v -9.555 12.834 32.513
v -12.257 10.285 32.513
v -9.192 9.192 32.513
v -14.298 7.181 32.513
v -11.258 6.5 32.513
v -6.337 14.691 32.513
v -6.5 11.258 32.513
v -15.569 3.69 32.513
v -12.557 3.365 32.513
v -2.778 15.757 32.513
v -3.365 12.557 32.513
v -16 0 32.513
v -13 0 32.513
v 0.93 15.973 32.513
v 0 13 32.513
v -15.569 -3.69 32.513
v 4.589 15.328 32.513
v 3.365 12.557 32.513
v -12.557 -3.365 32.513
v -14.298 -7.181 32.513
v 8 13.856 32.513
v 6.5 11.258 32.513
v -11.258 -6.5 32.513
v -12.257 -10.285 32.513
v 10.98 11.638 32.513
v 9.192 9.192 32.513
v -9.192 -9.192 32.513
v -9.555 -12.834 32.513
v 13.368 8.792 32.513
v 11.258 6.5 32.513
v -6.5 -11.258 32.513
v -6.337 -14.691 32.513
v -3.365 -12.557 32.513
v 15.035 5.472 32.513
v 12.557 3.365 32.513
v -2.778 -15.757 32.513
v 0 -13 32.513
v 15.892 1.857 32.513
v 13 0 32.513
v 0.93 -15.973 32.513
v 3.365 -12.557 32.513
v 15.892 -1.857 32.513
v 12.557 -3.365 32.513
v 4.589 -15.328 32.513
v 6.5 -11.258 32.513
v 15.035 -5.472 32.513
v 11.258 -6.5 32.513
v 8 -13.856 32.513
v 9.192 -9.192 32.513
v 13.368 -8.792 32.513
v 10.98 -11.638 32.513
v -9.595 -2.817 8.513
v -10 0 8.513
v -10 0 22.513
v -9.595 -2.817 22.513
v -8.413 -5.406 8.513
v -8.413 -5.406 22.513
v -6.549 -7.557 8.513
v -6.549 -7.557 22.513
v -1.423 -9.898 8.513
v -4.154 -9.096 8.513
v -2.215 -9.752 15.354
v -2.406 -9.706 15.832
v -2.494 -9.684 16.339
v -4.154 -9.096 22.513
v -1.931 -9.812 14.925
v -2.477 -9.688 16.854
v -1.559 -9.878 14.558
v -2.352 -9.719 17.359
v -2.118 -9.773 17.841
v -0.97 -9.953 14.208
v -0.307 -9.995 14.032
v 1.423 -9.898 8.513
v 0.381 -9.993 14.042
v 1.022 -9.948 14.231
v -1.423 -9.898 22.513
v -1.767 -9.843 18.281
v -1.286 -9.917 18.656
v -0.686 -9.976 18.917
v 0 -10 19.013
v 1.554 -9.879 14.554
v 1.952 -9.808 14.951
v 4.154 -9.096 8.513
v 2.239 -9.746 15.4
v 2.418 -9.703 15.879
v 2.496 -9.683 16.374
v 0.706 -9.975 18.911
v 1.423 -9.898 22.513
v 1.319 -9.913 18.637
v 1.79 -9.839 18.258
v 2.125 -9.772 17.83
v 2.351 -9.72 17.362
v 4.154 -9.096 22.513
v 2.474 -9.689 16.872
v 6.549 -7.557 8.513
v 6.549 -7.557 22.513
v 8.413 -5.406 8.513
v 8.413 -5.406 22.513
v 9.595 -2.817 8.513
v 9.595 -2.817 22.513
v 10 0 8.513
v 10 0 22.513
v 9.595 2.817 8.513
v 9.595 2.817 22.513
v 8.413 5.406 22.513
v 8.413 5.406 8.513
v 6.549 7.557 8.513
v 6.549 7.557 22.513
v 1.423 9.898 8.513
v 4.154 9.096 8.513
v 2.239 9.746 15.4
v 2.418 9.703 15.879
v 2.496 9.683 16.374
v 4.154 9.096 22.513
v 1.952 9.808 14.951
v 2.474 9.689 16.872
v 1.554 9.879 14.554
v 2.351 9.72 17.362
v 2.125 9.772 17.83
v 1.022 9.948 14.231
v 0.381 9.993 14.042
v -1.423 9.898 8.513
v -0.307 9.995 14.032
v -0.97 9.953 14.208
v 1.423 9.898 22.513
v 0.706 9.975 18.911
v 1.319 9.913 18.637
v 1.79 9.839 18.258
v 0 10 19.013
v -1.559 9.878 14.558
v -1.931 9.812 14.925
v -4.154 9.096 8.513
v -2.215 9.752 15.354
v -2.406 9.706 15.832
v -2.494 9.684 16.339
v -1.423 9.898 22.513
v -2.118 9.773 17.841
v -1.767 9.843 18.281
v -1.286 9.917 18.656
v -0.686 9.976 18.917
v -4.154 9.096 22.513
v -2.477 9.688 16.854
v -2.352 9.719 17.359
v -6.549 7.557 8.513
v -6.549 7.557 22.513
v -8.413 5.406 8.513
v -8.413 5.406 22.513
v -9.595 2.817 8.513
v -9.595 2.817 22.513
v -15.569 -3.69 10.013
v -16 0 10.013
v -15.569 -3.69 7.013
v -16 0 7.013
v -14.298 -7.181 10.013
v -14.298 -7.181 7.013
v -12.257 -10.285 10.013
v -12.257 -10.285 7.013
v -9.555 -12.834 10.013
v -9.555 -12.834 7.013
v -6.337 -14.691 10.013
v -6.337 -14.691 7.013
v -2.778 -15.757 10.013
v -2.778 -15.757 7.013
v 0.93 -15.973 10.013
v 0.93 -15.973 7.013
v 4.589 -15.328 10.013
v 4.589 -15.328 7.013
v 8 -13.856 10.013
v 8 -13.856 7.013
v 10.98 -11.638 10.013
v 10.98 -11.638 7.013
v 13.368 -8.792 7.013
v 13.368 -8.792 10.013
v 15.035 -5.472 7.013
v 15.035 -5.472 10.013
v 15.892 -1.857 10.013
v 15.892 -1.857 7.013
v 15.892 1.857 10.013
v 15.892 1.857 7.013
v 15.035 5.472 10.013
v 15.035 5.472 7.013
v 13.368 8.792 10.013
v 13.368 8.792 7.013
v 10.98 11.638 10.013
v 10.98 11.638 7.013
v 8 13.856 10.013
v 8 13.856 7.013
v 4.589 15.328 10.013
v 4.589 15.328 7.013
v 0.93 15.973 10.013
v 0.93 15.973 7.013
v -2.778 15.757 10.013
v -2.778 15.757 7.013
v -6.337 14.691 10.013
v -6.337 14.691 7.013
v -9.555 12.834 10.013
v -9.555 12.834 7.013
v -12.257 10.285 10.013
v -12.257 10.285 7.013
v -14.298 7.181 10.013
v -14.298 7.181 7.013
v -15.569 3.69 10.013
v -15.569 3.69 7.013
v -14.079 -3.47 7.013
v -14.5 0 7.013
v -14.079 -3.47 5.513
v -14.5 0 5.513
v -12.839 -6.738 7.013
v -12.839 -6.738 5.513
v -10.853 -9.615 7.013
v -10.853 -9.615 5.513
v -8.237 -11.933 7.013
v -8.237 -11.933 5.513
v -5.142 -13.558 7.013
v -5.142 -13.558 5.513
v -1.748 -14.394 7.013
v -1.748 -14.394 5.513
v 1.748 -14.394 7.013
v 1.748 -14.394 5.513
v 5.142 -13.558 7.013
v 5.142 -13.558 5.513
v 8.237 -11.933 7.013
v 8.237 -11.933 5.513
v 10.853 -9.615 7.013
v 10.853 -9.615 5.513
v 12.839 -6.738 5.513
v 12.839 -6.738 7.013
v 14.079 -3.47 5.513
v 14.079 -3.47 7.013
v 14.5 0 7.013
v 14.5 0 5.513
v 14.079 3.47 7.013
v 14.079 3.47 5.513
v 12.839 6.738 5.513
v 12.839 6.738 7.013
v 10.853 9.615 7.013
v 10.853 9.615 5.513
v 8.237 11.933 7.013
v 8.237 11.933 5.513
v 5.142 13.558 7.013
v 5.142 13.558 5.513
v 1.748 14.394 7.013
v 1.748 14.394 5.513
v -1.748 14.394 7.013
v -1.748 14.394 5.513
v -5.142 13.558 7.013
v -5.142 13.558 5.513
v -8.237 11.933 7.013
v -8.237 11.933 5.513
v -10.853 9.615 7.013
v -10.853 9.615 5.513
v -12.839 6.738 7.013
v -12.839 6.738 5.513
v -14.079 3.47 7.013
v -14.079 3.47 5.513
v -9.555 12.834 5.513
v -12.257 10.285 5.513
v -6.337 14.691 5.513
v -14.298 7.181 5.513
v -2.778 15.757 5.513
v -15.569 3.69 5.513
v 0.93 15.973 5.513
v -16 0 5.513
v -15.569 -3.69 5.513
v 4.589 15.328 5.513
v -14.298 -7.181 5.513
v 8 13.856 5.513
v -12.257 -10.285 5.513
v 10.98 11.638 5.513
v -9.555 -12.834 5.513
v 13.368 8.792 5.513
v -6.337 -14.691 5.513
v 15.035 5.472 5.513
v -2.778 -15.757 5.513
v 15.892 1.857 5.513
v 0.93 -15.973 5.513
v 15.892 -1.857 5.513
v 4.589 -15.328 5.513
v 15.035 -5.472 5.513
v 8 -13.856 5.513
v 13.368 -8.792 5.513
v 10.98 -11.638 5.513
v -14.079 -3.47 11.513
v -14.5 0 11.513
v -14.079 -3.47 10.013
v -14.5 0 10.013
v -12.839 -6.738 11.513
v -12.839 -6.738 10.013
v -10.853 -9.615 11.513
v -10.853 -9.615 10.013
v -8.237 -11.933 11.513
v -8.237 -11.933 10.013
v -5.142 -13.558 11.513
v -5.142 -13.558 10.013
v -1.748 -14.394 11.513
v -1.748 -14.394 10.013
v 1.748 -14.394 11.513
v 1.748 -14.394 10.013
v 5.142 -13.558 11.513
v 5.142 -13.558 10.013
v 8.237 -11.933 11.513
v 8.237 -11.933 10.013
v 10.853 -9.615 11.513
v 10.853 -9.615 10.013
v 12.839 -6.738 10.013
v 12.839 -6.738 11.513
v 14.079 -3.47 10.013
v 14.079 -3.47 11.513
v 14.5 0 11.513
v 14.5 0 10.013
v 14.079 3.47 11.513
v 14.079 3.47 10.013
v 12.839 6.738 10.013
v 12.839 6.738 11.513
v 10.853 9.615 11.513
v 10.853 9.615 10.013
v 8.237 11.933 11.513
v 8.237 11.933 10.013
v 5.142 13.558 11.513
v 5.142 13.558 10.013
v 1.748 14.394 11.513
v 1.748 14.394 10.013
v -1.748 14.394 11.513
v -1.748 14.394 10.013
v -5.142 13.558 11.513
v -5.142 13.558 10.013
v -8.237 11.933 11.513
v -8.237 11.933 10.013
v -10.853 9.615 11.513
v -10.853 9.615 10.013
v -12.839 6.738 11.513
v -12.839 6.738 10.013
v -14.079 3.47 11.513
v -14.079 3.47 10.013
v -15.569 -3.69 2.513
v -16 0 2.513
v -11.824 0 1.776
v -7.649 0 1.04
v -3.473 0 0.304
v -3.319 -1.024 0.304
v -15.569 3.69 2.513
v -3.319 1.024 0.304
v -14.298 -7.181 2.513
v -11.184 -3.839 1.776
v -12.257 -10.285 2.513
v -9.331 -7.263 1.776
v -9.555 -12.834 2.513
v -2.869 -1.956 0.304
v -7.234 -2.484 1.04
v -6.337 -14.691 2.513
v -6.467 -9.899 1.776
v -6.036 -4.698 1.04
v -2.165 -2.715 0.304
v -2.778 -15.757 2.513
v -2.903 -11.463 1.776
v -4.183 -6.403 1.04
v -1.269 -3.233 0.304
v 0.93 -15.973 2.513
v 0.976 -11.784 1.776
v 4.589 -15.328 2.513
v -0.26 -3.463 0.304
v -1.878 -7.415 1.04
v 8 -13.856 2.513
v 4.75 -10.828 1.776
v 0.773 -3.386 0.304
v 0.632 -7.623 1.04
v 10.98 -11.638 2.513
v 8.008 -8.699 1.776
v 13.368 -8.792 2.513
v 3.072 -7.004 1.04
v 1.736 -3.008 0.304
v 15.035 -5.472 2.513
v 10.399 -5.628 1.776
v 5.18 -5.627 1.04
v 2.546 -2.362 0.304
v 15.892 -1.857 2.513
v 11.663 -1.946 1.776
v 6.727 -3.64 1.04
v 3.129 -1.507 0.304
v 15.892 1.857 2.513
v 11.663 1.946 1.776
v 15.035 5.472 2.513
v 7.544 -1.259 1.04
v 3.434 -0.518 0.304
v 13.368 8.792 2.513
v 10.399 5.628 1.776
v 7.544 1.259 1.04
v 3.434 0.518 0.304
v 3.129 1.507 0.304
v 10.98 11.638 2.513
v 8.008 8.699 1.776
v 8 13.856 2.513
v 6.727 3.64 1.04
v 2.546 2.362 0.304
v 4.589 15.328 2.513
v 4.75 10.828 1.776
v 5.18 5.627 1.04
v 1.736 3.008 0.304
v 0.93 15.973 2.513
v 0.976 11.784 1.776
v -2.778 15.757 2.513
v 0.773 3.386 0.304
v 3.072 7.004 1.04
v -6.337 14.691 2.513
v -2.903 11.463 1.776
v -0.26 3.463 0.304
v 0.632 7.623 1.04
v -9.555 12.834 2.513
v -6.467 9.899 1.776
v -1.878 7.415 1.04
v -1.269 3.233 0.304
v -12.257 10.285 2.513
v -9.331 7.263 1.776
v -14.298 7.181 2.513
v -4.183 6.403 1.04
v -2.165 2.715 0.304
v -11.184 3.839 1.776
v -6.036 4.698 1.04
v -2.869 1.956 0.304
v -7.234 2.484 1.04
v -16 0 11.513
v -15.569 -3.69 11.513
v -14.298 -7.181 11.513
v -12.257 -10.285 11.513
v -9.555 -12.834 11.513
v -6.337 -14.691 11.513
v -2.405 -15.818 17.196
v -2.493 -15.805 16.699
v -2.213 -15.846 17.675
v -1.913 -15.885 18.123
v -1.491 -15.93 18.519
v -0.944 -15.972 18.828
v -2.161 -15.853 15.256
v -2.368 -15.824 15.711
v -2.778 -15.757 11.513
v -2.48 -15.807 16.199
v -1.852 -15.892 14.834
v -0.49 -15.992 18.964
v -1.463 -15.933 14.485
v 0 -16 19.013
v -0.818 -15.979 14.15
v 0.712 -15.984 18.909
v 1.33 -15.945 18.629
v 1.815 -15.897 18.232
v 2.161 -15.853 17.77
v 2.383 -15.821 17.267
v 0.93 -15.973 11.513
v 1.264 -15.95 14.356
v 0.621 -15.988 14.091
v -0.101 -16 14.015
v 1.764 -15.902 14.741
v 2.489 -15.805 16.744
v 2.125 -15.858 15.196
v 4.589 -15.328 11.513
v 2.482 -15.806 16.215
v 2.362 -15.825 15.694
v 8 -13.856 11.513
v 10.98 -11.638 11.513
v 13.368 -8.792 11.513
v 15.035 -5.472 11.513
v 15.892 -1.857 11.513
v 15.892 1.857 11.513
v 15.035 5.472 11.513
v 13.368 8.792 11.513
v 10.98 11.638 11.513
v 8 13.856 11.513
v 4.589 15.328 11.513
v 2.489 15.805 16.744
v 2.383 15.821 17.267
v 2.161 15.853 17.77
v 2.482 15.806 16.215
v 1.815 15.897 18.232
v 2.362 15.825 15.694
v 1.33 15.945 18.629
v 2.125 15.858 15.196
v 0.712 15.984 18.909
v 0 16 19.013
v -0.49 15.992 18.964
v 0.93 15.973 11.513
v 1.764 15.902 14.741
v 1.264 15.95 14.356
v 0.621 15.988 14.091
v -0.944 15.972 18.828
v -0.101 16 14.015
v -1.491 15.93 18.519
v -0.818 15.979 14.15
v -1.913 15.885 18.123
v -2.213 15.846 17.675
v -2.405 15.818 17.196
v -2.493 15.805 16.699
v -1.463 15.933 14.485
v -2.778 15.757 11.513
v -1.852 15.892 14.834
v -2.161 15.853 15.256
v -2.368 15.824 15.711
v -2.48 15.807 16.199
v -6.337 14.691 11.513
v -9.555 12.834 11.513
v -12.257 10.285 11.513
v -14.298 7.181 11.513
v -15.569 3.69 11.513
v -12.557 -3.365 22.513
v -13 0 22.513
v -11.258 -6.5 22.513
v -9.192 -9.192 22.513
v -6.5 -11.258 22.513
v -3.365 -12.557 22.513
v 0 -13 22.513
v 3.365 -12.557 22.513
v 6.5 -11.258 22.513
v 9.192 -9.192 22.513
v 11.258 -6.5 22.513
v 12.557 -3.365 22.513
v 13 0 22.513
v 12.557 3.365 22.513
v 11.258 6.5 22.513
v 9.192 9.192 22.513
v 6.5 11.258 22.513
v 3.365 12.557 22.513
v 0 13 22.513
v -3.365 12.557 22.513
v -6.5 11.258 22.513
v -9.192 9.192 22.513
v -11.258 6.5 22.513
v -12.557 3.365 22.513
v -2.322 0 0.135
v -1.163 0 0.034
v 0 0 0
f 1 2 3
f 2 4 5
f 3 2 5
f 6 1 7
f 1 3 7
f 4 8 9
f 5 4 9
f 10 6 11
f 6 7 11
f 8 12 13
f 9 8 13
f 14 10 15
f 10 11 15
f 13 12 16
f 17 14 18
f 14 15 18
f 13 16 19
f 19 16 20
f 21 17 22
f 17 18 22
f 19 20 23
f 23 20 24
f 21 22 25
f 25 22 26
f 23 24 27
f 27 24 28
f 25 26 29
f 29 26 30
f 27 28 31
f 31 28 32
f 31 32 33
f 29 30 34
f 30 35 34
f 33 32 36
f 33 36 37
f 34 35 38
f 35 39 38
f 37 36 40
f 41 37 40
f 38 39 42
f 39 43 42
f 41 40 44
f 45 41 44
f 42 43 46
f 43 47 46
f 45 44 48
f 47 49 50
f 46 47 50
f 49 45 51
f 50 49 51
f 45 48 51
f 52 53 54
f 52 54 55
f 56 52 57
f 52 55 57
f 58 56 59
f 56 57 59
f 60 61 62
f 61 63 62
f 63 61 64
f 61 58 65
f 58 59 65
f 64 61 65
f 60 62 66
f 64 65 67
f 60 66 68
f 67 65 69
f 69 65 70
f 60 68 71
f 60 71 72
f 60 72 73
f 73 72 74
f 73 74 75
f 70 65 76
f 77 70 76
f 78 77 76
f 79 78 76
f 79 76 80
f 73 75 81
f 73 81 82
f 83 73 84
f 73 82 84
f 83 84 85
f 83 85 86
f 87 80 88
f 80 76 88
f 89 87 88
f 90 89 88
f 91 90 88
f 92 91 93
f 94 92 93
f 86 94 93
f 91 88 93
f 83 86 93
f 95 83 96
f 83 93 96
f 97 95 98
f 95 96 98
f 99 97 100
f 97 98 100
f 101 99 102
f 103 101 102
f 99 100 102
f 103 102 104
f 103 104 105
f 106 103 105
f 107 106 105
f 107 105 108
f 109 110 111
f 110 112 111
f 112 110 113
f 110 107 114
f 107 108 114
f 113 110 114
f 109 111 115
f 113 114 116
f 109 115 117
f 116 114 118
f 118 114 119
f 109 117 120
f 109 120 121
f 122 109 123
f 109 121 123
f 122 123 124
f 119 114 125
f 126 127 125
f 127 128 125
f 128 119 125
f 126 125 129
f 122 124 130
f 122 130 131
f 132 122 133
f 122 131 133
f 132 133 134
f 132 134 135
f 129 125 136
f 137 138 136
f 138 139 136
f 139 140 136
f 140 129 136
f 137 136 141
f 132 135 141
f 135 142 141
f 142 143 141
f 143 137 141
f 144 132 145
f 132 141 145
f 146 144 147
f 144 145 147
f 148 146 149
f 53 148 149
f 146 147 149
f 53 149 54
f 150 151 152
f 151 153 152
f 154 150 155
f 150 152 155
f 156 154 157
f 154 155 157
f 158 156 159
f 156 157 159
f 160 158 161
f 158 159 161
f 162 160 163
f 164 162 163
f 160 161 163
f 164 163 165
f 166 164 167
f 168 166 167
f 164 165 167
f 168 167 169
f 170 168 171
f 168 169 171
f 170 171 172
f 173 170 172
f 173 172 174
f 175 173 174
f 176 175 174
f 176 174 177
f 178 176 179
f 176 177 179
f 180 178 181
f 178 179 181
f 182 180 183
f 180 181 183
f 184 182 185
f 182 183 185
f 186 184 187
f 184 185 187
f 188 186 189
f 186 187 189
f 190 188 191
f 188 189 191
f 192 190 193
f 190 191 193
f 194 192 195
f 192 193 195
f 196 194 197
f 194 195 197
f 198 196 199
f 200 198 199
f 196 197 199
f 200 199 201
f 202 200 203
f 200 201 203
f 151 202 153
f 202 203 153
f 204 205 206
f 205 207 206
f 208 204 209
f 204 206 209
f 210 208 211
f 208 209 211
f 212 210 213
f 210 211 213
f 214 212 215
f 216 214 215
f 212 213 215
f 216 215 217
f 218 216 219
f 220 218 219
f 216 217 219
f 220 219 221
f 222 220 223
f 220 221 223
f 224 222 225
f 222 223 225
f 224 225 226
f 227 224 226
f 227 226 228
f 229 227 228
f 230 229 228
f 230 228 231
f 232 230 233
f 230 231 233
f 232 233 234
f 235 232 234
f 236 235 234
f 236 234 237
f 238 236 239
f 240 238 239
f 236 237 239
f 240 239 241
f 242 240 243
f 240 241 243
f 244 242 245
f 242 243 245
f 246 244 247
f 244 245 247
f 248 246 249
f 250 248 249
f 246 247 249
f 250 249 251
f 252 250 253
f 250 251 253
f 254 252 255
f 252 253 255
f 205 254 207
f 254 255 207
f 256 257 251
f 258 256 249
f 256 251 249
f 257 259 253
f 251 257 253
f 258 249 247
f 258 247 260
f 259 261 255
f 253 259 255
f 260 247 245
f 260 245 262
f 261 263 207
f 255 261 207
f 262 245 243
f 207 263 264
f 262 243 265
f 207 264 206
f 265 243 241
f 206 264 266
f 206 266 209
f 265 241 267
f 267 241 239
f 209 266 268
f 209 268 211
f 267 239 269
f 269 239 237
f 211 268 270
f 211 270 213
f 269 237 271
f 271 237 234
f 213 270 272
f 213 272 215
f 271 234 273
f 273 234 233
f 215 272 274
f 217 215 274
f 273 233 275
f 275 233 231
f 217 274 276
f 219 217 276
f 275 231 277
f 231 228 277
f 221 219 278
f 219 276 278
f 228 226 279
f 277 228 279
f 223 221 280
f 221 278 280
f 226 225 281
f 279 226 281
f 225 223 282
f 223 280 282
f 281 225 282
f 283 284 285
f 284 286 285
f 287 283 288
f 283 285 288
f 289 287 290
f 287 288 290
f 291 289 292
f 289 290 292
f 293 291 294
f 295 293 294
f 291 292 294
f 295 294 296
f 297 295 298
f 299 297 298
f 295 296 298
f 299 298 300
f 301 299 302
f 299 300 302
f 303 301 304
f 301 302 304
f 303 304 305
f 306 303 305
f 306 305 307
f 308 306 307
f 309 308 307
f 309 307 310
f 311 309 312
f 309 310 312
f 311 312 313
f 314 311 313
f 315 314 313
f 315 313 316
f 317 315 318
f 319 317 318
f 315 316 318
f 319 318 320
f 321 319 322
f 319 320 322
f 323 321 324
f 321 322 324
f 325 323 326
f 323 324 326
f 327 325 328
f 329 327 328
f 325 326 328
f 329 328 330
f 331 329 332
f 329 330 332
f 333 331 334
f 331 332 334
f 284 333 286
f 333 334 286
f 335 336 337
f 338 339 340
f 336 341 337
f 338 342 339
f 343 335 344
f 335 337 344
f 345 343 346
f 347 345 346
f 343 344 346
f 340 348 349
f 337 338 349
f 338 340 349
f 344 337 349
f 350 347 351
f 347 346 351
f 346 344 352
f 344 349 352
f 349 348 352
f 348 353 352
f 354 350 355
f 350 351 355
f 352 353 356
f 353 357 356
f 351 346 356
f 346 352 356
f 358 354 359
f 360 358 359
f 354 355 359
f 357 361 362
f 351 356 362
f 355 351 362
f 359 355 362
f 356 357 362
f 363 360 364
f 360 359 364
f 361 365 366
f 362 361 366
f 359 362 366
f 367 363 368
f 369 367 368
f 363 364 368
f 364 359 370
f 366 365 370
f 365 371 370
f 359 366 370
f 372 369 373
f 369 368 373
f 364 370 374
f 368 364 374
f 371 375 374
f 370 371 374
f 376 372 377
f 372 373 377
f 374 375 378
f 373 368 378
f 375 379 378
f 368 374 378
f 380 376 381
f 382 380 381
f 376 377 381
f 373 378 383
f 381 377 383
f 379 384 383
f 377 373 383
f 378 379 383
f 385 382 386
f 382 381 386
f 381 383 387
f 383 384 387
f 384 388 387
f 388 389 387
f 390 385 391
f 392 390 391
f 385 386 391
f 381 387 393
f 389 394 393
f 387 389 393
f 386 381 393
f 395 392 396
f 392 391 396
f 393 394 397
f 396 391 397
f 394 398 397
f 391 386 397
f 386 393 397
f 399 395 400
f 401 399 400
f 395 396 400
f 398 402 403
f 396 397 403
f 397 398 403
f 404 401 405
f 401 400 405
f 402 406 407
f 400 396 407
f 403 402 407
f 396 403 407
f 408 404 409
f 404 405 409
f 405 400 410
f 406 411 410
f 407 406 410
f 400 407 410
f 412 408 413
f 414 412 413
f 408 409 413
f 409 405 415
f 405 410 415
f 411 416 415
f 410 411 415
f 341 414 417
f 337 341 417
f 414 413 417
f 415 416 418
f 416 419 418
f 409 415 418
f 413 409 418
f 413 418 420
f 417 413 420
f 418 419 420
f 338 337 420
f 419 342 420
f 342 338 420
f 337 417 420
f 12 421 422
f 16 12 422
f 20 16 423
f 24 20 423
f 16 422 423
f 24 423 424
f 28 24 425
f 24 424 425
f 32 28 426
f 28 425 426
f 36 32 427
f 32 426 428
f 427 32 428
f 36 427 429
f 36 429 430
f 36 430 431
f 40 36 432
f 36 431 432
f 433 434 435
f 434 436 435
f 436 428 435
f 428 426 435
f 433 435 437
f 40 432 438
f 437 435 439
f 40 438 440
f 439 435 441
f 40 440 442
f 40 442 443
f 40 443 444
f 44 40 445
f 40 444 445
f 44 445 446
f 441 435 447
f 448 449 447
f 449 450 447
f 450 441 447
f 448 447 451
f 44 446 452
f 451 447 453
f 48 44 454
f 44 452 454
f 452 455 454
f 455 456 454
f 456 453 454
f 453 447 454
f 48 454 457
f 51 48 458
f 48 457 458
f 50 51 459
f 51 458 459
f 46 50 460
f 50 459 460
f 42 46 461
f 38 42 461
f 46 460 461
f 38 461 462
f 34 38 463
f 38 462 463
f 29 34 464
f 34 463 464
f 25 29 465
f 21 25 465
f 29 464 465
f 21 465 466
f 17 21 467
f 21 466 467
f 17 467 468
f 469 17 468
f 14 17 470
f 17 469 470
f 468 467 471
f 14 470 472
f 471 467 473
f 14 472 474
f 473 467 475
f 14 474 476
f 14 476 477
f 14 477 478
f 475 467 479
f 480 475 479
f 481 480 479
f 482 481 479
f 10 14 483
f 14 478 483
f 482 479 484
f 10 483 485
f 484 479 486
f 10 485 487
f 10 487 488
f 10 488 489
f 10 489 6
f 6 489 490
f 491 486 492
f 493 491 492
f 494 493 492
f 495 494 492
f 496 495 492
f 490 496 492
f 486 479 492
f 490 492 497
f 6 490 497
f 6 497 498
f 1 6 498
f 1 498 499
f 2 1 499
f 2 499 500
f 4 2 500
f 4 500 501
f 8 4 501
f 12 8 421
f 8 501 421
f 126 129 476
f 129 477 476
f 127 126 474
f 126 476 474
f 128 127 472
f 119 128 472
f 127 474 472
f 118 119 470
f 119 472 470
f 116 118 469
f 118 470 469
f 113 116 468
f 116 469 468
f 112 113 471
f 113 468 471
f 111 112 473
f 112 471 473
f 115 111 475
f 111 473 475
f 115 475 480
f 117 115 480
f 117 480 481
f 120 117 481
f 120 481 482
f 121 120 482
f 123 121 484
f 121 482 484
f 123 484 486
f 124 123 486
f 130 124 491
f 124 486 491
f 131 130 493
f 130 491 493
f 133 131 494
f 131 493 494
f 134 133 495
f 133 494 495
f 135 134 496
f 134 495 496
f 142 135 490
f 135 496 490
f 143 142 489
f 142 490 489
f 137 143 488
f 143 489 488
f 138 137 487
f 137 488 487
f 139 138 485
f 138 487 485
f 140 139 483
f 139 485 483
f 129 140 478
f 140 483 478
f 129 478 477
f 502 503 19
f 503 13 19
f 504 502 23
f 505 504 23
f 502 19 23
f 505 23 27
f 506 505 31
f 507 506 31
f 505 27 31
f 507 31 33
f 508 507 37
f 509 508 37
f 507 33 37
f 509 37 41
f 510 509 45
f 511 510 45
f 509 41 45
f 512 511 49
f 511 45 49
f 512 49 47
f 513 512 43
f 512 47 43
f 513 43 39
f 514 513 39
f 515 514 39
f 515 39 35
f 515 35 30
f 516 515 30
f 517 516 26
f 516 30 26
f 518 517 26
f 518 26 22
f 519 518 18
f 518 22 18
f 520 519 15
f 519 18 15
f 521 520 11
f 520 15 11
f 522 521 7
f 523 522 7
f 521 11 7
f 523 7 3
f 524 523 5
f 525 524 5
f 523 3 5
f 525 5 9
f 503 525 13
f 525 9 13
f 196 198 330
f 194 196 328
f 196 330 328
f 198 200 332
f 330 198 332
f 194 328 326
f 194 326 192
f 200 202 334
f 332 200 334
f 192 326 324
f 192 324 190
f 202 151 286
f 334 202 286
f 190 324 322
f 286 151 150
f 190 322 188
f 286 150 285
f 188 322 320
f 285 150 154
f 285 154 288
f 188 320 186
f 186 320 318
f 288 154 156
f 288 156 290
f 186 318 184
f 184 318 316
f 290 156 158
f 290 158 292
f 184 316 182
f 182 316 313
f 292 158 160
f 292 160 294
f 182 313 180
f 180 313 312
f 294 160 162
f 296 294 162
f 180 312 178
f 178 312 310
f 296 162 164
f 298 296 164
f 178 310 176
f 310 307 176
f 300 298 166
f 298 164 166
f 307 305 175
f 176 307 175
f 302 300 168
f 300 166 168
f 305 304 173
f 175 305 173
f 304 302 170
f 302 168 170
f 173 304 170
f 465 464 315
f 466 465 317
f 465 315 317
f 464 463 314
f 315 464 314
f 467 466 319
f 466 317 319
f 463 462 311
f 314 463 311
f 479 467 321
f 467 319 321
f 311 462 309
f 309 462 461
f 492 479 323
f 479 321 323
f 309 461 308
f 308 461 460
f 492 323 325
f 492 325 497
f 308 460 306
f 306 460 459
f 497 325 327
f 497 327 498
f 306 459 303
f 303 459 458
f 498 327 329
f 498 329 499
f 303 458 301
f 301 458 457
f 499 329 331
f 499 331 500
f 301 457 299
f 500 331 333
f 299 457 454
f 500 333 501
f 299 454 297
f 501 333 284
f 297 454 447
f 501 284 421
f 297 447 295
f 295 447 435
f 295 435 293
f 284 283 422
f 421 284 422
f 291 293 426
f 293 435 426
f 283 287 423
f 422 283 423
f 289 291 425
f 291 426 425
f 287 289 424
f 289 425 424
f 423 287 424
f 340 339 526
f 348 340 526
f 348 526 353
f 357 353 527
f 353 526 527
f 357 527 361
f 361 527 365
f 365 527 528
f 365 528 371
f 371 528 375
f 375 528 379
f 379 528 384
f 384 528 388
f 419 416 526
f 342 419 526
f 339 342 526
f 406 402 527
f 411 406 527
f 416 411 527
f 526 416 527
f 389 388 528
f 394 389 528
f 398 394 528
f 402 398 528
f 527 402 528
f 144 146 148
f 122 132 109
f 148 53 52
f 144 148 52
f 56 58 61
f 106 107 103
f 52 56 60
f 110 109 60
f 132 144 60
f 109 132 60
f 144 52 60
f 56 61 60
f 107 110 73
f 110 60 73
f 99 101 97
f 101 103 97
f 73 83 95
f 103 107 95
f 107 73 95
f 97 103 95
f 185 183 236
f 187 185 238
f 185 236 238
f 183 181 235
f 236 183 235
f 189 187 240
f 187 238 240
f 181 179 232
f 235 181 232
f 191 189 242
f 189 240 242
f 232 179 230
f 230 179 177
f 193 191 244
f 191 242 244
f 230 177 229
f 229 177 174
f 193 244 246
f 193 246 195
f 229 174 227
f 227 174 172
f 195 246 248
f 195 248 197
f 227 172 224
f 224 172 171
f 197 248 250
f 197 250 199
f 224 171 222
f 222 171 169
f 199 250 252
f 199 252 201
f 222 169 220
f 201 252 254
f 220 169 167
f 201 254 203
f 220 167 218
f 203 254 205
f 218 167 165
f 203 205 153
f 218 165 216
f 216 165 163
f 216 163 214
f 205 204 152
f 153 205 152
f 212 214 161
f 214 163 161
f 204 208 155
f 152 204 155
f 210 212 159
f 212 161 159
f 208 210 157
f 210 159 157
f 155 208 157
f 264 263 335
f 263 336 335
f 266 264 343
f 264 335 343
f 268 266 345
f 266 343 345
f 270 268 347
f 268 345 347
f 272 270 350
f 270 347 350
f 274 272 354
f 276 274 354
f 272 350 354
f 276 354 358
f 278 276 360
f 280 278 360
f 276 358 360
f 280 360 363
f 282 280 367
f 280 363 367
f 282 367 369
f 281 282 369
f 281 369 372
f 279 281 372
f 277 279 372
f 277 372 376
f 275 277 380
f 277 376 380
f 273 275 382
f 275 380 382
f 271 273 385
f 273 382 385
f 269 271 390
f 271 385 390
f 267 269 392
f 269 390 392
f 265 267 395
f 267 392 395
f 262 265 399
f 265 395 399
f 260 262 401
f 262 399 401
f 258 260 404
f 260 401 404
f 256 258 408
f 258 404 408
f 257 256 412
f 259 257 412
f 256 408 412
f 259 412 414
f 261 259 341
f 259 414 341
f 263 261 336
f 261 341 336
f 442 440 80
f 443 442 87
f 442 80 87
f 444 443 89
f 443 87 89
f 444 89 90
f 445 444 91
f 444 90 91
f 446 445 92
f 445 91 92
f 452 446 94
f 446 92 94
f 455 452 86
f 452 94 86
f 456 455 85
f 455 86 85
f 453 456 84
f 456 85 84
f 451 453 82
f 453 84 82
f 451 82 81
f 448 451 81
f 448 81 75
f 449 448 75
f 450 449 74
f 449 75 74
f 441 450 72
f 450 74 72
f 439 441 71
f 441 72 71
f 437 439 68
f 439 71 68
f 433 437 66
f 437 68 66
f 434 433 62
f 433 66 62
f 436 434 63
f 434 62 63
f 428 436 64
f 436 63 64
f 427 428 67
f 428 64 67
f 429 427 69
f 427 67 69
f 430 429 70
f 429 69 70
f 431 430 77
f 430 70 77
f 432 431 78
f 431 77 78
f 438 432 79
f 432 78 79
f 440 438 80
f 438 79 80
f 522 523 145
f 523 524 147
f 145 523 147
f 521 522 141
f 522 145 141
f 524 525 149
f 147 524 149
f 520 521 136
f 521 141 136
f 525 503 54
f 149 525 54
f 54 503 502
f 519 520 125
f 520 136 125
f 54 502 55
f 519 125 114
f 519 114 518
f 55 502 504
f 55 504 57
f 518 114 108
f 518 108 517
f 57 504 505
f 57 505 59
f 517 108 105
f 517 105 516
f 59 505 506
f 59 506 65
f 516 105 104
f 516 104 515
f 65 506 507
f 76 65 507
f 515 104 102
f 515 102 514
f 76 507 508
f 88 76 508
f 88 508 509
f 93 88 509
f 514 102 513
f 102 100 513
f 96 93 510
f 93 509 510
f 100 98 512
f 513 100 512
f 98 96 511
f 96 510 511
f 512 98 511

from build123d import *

# Parameters (mm, degrees)
SKETCH3_R          = 2.5
CUT_EXTRUDE1_DEPTH = 40


with BuildPart() as part:
    # Sketch1 → Revolve1 (revolve)
    with BuildSketch(Plane(origin=(0, 0, 0), x_dir=(1, 0, 0), z_dir=(0, 1, 0)), mode=Mode.PRIVATE) as revolve1_sk:
        with BuildLine():
            Line((16, -2.512699454), (3.472963553, -0.30384494))
            ThreePointArc((3.472963553, -0.30384494), (1.743114855, -0.076106038), (0, 0))
            Line((0, 0), (0, -8.512699454))
            Line((0, -8.512699454), (10, -8.512699454))
            Line((10, -8.512699454), (10, -22.512699454))
            Line((10, -22.512699454), (13, -22.512699454))
            Line((13, -22.512699454), (13, -32.512699454))
            Line((13, -32.512699454), (16, -32.512699454))
            Line((16, -32.512699454), (16, -11.512699454))
            Line((16, -11.512699454), (14.5, -11.512699454))
            Line((14.5, -11.512699454), (14.5, -10.012699454))
            Line((14.5, -10.012699454), (16, -10.012699454))
            Line((16, -10.012699454), (16, -7.012699454))
            Line((16, -7.012699454), (14.5, -7.012699454))
            Line((14.5, -7.012699454), (14.5, -5.512699454))
            Line((14.5, -5.512699454), (16, -5.512699454))
            Line((16, -5.512699454), (16, -2.512699454))
        make_face()
    revolve(revolve1_sk.sketch.rotate(Axis((0, 0, 0), (0, 0, 1)), 180), axis=Axis((0, 0, 0), (0, 0, 1)))

    # Sketch3 → Cut-Extrude1 (cut, symmetric)
    with BuildSketch(Plane(origin=(0, 0, 0), x_dir=(0, 0, -1), z_dir=(0, 1, 0))):
        with Locations(Location((-16.512699454, 0, 0), (0, 0, 180))):
            Circle(SKETCH3_R)
    extrude(amount=CUT_EXTRUDE1_DEPTH, both=True, mode=Mode.SUBTRACT)


solid = part.part
